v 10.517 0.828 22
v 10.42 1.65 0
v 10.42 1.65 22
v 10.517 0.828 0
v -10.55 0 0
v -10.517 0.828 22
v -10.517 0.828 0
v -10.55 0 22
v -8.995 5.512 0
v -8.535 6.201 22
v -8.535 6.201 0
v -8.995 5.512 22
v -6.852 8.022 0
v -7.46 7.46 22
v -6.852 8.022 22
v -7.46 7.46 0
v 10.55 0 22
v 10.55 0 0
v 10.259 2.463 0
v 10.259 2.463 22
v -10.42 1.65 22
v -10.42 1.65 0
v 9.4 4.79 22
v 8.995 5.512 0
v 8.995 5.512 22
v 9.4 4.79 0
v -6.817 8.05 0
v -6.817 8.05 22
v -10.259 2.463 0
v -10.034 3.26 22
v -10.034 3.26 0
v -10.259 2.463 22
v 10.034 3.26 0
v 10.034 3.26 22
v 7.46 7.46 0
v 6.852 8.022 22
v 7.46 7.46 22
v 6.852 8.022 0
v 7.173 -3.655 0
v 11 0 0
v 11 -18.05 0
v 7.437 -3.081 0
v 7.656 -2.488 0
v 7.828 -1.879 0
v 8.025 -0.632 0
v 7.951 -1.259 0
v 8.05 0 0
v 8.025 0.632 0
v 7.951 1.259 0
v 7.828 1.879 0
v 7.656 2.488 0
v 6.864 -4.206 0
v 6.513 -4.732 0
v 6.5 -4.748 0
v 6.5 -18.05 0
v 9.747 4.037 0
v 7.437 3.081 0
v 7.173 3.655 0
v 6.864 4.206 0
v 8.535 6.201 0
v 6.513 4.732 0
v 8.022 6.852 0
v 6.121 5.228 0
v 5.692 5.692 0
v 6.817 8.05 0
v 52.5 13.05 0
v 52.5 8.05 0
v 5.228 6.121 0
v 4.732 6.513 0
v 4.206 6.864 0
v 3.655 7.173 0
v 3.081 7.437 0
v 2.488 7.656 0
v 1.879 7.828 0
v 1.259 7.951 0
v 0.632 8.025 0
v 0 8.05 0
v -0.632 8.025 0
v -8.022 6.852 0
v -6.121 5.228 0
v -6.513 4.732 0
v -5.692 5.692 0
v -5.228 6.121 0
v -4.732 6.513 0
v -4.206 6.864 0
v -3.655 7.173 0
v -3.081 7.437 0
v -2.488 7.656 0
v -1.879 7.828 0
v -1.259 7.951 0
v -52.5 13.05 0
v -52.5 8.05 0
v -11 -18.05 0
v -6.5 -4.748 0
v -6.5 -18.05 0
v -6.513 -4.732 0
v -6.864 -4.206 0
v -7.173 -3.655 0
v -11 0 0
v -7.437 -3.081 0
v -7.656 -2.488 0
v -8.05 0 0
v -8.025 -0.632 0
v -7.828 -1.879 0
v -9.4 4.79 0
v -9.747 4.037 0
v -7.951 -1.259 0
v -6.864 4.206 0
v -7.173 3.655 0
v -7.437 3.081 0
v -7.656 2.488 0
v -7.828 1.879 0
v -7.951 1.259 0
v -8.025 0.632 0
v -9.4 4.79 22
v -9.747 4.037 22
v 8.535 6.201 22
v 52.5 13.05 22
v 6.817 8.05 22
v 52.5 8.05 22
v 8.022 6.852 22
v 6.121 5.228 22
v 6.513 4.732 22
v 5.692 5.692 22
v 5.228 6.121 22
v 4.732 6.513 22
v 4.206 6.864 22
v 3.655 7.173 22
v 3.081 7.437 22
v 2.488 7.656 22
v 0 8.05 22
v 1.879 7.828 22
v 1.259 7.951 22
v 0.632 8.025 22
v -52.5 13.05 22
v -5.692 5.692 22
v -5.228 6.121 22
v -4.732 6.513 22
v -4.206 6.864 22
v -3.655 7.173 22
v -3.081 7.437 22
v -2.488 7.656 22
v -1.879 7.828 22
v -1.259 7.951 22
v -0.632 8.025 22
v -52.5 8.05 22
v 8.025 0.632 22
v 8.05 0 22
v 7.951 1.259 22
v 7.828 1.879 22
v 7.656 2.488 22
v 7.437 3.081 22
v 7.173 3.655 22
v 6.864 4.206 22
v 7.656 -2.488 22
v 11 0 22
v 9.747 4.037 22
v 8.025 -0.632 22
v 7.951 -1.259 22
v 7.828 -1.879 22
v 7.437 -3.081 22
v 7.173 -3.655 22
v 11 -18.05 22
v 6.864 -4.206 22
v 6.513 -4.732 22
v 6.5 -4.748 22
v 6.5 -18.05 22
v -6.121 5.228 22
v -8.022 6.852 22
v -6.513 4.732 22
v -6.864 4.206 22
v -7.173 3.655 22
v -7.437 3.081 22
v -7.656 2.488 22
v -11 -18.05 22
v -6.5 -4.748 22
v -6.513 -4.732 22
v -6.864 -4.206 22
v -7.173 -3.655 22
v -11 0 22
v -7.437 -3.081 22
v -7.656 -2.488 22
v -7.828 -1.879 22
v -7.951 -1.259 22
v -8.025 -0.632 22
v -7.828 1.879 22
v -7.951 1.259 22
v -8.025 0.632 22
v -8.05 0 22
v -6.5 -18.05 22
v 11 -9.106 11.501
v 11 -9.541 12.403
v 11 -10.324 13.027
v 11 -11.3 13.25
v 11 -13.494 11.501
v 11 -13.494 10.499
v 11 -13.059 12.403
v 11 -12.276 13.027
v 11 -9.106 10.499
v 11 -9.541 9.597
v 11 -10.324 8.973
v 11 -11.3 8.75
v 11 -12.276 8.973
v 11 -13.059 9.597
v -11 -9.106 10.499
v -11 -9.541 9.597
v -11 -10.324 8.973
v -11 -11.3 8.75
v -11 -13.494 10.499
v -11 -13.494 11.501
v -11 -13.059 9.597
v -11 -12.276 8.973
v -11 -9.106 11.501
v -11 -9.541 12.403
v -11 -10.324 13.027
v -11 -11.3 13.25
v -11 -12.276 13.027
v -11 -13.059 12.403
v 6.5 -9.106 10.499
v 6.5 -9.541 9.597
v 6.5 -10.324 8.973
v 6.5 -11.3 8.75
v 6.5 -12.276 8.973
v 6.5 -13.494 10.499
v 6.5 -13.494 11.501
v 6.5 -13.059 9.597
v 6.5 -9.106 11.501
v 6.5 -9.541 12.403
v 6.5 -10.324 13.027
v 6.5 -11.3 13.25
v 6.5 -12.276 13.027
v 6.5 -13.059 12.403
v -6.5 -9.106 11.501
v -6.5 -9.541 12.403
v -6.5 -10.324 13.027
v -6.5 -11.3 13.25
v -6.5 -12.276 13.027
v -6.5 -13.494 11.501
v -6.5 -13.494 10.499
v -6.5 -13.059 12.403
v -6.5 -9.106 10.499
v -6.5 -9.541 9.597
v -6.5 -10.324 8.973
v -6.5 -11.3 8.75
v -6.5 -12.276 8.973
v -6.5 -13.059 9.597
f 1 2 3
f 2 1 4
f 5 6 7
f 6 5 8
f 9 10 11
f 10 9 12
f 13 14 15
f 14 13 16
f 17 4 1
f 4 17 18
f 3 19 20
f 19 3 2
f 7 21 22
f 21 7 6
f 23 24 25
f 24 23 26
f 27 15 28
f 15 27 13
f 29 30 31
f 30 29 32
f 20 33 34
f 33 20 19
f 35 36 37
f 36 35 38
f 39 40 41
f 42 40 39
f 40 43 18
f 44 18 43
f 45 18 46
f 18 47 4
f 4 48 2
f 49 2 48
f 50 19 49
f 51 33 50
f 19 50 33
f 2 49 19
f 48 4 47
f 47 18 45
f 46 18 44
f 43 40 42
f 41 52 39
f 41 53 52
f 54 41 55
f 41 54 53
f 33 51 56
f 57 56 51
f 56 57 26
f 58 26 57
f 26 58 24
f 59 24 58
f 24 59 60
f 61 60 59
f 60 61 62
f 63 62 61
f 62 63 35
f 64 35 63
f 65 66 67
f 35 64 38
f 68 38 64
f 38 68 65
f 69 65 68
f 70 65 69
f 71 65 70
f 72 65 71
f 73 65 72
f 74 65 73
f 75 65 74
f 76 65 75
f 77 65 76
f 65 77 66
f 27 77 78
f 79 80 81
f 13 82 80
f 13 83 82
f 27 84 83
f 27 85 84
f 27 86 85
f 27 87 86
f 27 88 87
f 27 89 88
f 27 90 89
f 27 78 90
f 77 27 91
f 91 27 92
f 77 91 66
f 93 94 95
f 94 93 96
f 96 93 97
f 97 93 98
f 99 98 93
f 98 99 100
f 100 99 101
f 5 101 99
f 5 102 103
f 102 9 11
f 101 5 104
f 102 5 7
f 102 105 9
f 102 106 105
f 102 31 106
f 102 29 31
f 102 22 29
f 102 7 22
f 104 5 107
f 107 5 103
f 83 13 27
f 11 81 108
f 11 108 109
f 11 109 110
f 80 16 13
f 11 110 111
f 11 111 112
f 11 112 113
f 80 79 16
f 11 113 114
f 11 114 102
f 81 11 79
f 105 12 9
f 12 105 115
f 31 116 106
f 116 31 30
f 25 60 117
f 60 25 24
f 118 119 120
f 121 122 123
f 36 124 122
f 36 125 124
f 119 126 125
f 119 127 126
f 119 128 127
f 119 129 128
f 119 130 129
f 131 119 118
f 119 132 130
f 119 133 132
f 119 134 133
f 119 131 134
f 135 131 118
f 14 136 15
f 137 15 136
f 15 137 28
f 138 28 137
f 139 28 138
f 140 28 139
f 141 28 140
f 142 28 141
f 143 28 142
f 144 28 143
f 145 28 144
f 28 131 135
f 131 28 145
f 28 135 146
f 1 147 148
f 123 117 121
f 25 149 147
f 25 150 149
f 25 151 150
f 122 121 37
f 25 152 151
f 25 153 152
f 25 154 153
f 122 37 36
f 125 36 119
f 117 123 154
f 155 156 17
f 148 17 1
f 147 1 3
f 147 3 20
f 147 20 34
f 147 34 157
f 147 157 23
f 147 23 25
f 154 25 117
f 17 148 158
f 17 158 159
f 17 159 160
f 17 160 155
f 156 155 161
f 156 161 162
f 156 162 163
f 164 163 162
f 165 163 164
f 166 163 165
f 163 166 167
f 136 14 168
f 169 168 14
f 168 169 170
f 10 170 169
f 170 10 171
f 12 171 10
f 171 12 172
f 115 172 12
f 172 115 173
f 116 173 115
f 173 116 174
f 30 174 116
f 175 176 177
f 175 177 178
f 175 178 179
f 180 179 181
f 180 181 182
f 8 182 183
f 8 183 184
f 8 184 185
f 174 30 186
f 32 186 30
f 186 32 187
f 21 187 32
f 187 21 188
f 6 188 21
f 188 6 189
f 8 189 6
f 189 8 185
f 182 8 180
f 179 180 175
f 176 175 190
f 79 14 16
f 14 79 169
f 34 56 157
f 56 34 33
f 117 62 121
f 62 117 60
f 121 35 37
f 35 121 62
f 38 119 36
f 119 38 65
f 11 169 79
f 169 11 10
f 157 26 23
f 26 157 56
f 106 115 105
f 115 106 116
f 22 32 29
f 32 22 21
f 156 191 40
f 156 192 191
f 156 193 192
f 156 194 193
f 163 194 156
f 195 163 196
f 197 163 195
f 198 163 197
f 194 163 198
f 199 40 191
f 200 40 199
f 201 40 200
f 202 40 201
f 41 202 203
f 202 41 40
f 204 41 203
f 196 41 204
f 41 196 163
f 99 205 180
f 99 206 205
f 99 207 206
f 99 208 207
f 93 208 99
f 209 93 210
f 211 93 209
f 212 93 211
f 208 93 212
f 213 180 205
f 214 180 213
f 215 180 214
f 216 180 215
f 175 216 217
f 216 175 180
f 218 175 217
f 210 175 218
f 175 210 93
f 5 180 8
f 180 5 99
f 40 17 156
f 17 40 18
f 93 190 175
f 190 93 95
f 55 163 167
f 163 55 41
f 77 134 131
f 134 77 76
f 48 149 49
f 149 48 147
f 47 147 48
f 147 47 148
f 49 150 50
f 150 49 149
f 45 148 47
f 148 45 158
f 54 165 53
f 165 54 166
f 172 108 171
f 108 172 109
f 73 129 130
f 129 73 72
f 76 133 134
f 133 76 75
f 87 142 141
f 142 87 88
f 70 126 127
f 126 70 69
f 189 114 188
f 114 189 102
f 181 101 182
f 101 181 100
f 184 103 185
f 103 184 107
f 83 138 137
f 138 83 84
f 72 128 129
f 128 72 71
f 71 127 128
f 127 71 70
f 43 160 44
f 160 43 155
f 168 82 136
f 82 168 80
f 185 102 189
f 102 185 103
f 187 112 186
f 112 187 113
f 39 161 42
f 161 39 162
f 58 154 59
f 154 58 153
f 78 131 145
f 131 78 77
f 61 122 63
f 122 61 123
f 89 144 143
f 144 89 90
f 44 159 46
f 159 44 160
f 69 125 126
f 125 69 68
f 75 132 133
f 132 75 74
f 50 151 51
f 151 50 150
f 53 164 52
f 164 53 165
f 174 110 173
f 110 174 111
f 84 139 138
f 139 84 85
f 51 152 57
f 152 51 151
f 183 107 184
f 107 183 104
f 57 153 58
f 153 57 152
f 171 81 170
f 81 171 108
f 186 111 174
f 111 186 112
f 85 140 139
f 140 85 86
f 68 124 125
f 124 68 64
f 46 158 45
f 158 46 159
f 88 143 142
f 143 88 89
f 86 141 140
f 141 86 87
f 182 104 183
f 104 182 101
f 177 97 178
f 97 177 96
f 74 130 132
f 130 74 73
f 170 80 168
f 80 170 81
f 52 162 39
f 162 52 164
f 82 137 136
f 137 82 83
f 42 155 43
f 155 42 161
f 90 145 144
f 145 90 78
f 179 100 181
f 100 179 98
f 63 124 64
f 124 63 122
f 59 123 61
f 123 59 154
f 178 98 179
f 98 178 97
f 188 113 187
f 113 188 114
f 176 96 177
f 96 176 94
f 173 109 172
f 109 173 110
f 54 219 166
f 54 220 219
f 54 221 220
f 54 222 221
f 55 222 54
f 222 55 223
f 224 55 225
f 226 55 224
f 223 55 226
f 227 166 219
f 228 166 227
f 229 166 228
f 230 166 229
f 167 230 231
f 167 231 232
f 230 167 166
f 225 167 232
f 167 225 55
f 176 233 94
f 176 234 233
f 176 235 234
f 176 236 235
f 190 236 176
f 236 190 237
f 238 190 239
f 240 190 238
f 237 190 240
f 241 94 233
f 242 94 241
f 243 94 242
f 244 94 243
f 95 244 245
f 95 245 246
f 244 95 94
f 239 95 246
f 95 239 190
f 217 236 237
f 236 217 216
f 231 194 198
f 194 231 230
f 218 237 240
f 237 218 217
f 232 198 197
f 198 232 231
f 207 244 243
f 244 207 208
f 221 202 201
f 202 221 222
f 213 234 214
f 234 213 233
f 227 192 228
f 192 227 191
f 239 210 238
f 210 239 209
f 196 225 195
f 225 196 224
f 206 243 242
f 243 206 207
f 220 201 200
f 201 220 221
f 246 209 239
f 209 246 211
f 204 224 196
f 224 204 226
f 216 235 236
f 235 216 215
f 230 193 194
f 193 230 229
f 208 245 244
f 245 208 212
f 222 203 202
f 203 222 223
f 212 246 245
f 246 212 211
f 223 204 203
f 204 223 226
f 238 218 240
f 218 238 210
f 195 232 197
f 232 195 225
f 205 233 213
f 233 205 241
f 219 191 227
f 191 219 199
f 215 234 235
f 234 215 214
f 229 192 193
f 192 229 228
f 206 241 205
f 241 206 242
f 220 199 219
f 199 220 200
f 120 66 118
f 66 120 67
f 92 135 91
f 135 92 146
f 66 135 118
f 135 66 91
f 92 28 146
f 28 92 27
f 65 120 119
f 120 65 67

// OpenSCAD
shaftDiameter = 16.1;
clampWidth = 22;
clampThickness = 2.5 ;
clampLegLengthFromShaft = 10 ;
clampLegThickness = clampThickness + 2 ; // default is 'clampThickness' to keep it the same thickness as the clamp
clampLegGap = 13;
clampToClampScrewCenter = (clampLegLengthFromShaft - clampThickness) / 2 - 3 ; //using '(clampLegLengthFromShaft - clampThickness) / 2' nearly centres this hole on the clamp leg
clampScrewDiameter = 4.5 ;
shaftToMountPlate = 0 ;
mountPlateThickness = 5 ;
mountPlateLength = 105 ;
mountHoleSpacing = 30 ;
mountHoleDiameter = 3.5 ;
screwHoleSmoothness = 14 ; //6 = printable vertically. Applies to mount plate screw holes and clamp leg screw holes
clampSmoothness = 80 ;

tieGuideWidth = 11;
tieGuidHeight = 4;
tieGuideOpening = 2;

solarShieldOuterDiameter = clampWidth;
solarShieldInnerDiameter = solarShieldOuterDiameter-4;
solarShieldLength = 30;
solarShieldCenterHeight = 5;

clampWithMountPlate();

module clampWithMountPlate(){
	union(){
        	clamp();
		plate();
		//solarShield();
    }
}

module solarShield() {
    translate([-mountPlateLength/2, solarShieldCenterHeight+shaftDiameter/2+shaftToMountPlate+mountPlateThickness, clampWidth/2])
        rotate([90,0,90])
        		difference() {
				union() {
					cylinder(d=solarShieldOuterDiameter, h=solarShieldLength, center=false, $fn=clampSmoothness);
					translate([-solarShieldCenterHeight,-solarShieldOuterDiameter/2,0])
						cube([solarShieldCenterHeight, solarShieldOuterDiameter, solarShieldLength], center=false);
				}
				cylinder(d=solarShieldInnerDiameter, h=solarShieldLength, center=false, $fn=clampSmoothness);
				translate([-solarShieldOuterDiameter/2-solarShieldCenterHeight, -solarShieldOuterDiameter/2,0])
					cube([solarShieldOuterDiameter/2-solarShieldCenterHeight, solarShieldOuterDiameter, solarShieldLength]);
			}
}

module plate(){
    translate([0,shaftDiameter / 2 + shaftToMountPlate + mountPlateThickness / 2,clampWidth / 2])
        union(){
            cube([mountPlateLength,mountPlateThickness,clampWidth], center = true);
//            rotate([90,0,0])
//                translate([mountPlateLength/2-(mountPlateLength/2-clampWidth/2)/2, tieGuidHeight, -mountPlateThickness/2])
//                    cylinder(r=tieGuideWidth/2, h=mountPlateThickness, center=false);
        }
}

module clamp(){
    difference(){
        union(){
            cylinder(r = shaftDiameter / 2 + clampThickness, h = clampWidth, $fn = clampSmoothness);
            translate([0,-(shaftDiameter / 2 + clampLegLengthFromShaft) / 2,clampWidth / 2]) cube([clampLegThickness * 2 + clampLegGap, shaftDiameter / 2 + clampLegLengthFromShaft,clampWidth], center = true);
        }
            translate([0,0,-1]) cylinder(r = shaftDiameter / 2,h = clampWidth + 2, $fn = clampSmoothness);        
            translate([0, -(shaftDiameter / 4 + clampLegLengthFromShaft ) + 0.1, clampWidth / 2]) cube([clampLegGap, shaftDiameter / 2 + clampLegLengthFromShaft * 2, clampWidth + 2], center = true);
            translate([0, -(shaftDiameter / 2 + clampThickness + clampToClampScrewCenter ), clampWidth / 2]) rotate([0, 90, 0]) cylinder(r = clampScrewDiameter / 2, h = clampLegThickness * 2 + clampLegGap + 2,center = true, $fn = screwHoleSmoothness);
    }
}
